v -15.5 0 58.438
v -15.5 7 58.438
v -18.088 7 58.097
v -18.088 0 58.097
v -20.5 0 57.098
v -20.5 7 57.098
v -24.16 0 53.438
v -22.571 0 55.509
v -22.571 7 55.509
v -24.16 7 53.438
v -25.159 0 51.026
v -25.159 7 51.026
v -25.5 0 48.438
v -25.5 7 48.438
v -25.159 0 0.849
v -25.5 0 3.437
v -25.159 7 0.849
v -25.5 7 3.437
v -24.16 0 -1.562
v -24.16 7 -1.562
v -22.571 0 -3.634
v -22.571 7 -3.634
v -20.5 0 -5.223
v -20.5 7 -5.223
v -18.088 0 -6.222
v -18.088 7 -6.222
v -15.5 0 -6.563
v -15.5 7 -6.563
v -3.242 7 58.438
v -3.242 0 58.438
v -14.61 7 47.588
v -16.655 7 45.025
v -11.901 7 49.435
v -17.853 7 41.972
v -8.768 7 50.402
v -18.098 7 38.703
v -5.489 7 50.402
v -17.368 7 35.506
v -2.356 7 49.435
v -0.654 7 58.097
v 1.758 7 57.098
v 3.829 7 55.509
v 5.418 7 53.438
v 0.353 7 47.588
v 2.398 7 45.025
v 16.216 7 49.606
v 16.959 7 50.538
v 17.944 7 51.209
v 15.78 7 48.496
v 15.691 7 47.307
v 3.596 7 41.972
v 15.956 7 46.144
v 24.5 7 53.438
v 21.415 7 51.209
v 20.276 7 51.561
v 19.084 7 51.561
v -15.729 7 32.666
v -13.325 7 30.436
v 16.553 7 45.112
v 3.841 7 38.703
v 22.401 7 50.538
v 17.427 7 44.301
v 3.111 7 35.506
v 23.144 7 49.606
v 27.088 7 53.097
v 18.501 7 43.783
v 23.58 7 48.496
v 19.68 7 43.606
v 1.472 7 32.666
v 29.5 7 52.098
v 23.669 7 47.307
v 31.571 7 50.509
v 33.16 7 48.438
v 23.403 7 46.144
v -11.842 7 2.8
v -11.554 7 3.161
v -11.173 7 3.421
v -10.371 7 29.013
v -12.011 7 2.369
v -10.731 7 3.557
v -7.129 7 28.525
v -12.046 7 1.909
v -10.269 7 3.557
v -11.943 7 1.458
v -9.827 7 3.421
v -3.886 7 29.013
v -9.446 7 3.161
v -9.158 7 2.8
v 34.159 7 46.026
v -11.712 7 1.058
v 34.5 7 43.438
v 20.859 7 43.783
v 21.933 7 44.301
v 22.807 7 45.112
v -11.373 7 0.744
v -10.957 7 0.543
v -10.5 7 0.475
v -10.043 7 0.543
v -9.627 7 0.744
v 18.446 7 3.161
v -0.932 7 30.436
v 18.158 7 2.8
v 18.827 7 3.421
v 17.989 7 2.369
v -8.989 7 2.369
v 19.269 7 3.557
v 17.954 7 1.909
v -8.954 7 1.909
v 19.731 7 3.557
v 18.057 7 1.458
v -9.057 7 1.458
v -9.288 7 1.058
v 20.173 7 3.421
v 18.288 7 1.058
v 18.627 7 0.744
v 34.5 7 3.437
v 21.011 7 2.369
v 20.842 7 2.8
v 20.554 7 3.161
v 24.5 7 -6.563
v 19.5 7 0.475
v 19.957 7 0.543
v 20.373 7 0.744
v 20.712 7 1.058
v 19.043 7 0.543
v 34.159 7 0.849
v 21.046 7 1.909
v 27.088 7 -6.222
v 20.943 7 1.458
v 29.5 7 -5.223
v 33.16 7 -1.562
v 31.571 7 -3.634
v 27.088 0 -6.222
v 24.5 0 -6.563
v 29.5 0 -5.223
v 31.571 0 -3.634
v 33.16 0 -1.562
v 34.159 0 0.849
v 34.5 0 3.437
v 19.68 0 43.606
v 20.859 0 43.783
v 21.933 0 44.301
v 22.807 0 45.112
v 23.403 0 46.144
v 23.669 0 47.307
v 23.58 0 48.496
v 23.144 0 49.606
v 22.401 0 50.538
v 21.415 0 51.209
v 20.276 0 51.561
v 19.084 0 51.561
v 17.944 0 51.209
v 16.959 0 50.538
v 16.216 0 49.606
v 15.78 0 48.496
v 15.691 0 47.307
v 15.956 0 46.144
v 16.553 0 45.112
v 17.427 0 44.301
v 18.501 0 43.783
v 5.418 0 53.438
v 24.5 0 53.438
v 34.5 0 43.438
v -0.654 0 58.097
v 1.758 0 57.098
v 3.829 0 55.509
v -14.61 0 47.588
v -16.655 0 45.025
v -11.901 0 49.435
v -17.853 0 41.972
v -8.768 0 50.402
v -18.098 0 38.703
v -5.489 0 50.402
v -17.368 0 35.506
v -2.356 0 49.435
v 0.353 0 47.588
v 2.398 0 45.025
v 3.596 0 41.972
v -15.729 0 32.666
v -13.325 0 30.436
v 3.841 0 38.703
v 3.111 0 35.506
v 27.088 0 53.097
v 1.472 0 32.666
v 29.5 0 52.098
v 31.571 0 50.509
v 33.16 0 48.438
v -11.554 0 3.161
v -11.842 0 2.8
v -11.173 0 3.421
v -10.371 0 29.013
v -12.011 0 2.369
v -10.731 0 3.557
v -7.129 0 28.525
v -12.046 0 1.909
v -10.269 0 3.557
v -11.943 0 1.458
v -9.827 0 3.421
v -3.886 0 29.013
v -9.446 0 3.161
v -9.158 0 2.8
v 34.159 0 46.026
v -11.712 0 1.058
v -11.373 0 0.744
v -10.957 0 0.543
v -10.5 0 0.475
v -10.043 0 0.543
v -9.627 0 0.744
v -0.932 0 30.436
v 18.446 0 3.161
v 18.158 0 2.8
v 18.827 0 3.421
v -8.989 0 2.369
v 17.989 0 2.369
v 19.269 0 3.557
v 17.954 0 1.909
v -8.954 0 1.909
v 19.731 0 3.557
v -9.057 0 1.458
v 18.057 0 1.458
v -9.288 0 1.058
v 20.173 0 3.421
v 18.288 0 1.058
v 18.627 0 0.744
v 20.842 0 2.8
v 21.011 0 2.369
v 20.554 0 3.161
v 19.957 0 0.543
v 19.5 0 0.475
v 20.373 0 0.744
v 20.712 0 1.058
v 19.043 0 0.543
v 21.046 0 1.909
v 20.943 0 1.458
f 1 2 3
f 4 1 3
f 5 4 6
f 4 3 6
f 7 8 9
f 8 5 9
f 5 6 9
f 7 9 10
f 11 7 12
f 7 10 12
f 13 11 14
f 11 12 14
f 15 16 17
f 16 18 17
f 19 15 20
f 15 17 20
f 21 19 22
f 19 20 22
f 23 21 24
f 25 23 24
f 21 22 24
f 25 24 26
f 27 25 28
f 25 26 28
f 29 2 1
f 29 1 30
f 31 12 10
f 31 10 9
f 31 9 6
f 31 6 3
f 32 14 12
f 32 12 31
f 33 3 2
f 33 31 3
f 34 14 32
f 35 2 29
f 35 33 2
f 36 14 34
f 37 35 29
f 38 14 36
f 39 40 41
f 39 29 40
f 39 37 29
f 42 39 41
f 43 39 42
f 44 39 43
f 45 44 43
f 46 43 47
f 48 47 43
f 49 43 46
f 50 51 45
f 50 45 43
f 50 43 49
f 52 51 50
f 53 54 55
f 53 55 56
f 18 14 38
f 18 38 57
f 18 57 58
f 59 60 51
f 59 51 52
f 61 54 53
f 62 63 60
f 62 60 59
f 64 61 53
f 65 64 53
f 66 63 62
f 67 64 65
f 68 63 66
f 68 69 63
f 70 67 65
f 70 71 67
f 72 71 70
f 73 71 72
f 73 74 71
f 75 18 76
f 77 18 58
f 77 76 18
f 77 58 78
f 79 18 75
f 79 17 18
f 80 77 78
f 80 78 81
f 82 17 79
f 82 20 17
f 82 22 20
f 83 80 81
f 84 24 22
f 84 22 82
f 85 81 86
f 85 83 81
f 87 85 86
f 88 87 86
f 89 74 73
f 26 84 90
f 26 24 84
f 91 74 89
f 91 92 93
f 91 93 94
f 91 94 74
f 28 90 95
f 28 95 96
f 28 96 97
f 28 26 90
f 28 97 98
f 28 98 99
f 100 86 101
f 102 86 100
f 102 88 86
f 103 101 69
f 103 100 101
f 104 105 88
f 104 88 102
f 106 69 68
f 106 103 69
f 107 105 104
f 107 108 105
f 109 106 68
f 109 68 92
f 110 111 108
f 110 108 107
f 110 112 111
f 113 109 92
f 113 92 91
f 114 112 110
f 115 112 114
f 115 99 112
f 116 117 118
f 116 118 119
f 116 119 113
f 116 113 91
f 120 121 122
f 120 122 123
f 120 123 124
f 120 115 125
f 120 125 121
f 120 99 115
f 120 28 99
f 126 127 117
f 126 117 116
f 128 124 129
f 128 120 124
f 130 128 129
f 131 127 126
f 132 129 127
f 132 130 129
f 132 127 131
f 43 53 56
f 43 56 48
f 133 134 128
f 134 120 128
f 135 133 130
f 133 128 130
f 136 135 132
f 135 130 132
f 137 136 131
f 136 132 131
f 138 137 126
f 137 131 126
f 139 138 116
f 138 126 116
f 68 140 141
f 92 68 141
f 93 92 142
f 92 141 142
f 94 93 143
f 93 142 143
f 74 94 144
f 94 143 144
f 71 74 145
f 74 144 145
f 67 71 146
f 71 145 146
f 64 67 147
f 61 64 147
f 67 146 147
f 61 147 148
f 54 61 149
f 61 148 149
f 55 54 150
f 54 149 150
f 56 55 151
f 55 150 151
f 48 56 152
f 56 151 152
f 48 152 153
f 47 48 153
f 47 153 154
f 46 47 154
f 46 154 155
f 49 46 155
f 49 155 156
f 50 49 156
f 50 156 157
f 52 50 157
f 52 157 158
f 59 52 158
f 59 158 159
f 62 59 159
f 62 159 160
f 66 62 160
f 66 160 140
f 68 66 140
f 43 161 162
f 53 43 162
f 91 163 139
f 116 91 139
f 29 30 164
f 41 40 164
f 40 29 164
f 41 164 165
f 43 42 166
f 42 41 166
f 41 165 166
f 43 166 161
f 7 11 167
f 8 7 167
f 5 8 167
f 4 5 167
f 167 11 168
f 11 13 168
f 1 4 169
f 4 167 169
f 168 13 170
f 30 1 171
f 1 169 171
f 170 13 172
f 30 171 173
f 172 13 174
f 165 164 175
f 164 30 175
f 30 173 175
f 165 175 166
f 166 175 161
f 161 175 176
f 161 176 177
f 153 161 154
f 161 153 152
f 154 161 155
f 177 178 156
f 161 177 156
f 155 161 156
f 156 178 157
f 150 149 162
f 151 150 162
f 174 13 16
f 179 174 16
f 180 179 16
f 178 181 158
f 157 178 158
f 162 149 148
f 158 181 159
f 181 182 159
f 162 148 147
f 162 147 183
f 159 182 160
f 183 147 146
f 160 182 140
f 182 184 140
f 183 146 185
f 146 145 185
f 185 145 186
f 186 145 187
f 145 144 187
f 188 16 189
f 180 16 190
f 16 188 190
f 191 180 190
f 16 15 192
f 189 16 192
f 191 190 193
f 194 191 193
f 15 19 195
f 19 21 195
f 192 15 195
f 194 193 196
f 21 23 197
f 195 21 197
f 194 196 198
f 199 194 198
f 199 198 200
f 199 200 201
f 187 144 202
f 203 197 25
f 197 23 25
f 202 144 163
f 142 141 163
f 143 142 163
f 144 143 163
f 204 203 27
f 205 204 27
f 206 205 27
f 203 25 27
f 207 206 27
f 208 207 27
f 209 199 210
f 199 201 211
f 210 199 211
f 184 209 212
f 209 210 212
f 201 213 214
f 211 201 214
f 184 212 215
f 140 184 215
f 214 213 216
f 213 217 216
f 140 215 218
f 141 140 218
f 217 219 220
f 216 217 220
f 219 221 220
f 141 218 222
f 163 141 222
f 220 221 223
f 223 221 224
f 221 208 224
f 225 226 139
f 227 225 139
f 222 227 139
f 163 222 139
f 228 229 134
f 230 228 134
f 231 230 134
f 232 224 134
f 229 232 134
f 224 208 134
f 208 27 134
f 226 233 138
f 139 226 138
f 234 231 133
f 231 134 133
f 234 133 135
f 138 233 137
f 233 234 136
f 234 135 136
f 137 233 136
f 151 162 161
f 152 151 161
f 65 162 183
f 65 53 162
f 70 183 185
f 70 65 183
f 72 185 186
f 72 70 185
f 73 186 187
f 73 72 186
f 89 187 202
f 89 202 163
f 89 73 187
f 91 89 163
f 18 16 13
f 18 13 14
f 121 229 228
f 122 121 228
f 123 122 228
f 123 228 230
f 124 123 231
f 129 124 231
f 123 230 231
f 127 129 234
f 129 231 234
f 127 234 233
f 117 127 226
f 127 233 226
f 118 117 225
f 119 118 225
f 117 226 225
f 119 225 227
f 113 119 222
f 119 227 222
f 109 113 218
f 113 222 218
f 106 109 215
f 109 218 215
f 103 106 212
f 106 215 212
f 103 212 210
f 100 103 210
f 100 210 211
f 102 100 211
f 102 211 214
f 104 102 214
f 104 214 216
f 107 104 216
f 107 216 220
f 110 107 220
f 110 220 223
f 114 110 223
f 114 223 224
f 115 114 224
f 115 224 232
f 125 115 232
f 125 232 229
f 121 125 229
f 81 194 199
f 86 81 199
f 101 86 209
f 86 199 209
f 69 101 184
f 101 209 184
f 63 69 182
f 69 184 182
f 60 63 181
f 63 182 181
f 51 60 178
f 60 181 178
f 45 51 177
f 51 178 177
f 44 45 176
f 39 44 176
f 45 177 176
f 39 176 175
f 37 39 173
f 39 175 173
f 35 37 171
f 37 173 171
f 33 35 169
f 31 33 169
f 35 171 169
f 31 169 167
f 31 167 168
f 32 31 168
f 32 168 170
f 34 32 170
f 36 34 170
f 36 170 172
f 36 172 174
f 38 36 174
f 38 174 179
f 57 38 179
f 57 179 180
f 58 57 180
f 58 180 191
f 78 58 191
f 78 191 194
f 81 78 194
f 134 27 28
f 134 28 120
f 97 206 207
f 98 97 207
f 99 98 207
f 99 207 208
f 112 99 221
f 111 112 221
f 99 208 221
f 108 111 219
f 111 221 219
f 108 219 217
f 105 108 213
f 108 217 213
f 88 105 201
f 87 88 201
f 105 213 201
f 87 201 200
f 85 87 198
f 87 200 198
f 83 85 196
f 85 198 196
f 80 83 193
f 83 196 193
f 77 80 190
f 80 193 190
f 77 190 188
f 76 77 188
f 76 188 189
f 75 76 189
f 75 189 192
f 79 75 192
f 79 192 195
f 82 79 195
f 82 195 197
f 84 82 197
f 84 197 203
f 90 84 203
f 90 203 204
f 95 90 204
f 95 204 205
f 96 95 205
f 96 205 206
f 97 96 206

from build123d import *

# Parameters (mm, degrees)
SKETCH_1_W          = 60
SKETCH_1_H          = 60
EXTRUDE_1_DEPTH     = 7
SKETCH_2_R          = 4
SKETCH_2_R_2        = 11
CUT_EXTRUDE_1_DEPTH = 64.990752506
SKETCH_3_R          = 1.55
CUT_EXTRUDE_2_DEPTH = 64.990752506
FILLET_2_R          = 10
SKETCH_4_W          = 30.91835897
SKETCH_4_H          = 7
EXTRUDE_2_DEPTH     = 5
FILLET_3_R          = 10


with BuildPart() as part:
    # 草图1 → 凸台-拉伸1 (new body)
    with BuildSketch(Plane(origin=(0, 0, 0), x_dir=(1, 0, 0), z_dir=(0, 1, 0))):
        with Locations((4.5, -23.4375)):
            Rectangle(SKETCH_1_W, SKETCH_1_H)
    extrude(amount=EXTRUDE_1_DEPTH)

    # 草图2 → 切除-拉伸1 (cut, through all)
    with BuildSketch(Plane.XZ):
        with Locations(Location((19.679947821, 47.605596436, 0), (0, 0, 270))):
            Circle(SKETCH_2_R)
        with Locations(Location((-7.128568068, 39.524539832, 0), (0, 0, 270))):
            Circle(SKETCH_2_R_2)
    extrude(amount=-CUT_EXTRUDE_1_DEPTH, mode=Mode.SUBTRACT)

    # 草图3 → 切除-拉伸2 (cut, through all)
    with BuildSketch(Plane.XZ):
        with Locations(Location((-10.5, 2.024539832, 0), (0, 0, 270))):
            Circle(SKETCH_3_R)
        with Locations(Location((19.5, 2.024539832, 0), (0, 0, 270))):
            Circle(SKETCH_3_R)
    extrude(amount=-CUT_EXTRUDE_2_DEPTH, mode=Mode.SUBTRACT)

    # 圆角2
    fillet_2_edges = [part.edges().sort_by_distance(p)[0] for p in [
        (-25.5, 3.5, -6.5625),
        (34.5, 3.5, -6.5625),
        (34.5, 3.5, 53.4375),
    ]]
    fillet(fillet_2_edges, radius=FILLET_2_R)

    # 草图4 → 凸台-拉伸2 (add)
    with BuildSketch(Plane.XY.offset(53.4375)):
        with Locations((-10.040820515, 3.5)):
            Rectangle(SKETCH_4_W, SKETCH_4_H)
    extrude(amount=EXTRUDE_2_DEPTH)

    # 圆角3
    # the kernel refuses this fillet: 10 mm, written as the material it takes off along each edge
    with BuildSketch(Plane(origin=(5.41835897, -21.650635095, 58.4375), x_dir=(-1, 0, 0), z_dir=(0, 1, 0))) as fillet_3_piece_1:
        with BuildLine():
            CenterArc((8.660254038, -10), FILLET_3_R, 90, 60)
            Line((0, -5), (-0.173205081, -4.9))
            ThreePointArc((-0.173205081, -4.9), (-0.2, -2.5), (-0.2, 0))
            Line((-0.2, 0), (0, 0.2))
            Line((0, 0.2), (8.660254038, 0.2))
            Line((8.660254038, 0.2), (8.660254038, 0))
        make_face()
    extrude(amount=50.301270189, mode=Mode.SUBTRACT)
    with BuildSketch(Plane(origin=(-25.5, 32, 58.4375), x_dir=(0, 0, -1), z_dir=(0, -1, 0))) as fillet_3_piece_2:
        with BuildLine():
            CenterArc((FILLET_3_R, FILLET_3_R), FILLET_3_R, 180, 90)
            Line((0, FILLET_3_R), (-FILLET_3_R * 0.02, FILLET_3_R))
            Line((-FILLET_3_R * 0.02, FILLET_3_R), (-FILLET_3_R * 0.02, -FILLET_3_R * 0.02))
            Line((-FILLET_3_R * 0.02, -FILLET_3_R * 0.02), (FILLET_3_R, -FILLET_3_R * 0.02))
            Line((FILLET_3_R, -FILLET_3_R * 0.02), (FILLET_3_R, 0))
        make_face()
    extrude(amount=57, mode=Mode.SUBTRACT)


solid = part.part
